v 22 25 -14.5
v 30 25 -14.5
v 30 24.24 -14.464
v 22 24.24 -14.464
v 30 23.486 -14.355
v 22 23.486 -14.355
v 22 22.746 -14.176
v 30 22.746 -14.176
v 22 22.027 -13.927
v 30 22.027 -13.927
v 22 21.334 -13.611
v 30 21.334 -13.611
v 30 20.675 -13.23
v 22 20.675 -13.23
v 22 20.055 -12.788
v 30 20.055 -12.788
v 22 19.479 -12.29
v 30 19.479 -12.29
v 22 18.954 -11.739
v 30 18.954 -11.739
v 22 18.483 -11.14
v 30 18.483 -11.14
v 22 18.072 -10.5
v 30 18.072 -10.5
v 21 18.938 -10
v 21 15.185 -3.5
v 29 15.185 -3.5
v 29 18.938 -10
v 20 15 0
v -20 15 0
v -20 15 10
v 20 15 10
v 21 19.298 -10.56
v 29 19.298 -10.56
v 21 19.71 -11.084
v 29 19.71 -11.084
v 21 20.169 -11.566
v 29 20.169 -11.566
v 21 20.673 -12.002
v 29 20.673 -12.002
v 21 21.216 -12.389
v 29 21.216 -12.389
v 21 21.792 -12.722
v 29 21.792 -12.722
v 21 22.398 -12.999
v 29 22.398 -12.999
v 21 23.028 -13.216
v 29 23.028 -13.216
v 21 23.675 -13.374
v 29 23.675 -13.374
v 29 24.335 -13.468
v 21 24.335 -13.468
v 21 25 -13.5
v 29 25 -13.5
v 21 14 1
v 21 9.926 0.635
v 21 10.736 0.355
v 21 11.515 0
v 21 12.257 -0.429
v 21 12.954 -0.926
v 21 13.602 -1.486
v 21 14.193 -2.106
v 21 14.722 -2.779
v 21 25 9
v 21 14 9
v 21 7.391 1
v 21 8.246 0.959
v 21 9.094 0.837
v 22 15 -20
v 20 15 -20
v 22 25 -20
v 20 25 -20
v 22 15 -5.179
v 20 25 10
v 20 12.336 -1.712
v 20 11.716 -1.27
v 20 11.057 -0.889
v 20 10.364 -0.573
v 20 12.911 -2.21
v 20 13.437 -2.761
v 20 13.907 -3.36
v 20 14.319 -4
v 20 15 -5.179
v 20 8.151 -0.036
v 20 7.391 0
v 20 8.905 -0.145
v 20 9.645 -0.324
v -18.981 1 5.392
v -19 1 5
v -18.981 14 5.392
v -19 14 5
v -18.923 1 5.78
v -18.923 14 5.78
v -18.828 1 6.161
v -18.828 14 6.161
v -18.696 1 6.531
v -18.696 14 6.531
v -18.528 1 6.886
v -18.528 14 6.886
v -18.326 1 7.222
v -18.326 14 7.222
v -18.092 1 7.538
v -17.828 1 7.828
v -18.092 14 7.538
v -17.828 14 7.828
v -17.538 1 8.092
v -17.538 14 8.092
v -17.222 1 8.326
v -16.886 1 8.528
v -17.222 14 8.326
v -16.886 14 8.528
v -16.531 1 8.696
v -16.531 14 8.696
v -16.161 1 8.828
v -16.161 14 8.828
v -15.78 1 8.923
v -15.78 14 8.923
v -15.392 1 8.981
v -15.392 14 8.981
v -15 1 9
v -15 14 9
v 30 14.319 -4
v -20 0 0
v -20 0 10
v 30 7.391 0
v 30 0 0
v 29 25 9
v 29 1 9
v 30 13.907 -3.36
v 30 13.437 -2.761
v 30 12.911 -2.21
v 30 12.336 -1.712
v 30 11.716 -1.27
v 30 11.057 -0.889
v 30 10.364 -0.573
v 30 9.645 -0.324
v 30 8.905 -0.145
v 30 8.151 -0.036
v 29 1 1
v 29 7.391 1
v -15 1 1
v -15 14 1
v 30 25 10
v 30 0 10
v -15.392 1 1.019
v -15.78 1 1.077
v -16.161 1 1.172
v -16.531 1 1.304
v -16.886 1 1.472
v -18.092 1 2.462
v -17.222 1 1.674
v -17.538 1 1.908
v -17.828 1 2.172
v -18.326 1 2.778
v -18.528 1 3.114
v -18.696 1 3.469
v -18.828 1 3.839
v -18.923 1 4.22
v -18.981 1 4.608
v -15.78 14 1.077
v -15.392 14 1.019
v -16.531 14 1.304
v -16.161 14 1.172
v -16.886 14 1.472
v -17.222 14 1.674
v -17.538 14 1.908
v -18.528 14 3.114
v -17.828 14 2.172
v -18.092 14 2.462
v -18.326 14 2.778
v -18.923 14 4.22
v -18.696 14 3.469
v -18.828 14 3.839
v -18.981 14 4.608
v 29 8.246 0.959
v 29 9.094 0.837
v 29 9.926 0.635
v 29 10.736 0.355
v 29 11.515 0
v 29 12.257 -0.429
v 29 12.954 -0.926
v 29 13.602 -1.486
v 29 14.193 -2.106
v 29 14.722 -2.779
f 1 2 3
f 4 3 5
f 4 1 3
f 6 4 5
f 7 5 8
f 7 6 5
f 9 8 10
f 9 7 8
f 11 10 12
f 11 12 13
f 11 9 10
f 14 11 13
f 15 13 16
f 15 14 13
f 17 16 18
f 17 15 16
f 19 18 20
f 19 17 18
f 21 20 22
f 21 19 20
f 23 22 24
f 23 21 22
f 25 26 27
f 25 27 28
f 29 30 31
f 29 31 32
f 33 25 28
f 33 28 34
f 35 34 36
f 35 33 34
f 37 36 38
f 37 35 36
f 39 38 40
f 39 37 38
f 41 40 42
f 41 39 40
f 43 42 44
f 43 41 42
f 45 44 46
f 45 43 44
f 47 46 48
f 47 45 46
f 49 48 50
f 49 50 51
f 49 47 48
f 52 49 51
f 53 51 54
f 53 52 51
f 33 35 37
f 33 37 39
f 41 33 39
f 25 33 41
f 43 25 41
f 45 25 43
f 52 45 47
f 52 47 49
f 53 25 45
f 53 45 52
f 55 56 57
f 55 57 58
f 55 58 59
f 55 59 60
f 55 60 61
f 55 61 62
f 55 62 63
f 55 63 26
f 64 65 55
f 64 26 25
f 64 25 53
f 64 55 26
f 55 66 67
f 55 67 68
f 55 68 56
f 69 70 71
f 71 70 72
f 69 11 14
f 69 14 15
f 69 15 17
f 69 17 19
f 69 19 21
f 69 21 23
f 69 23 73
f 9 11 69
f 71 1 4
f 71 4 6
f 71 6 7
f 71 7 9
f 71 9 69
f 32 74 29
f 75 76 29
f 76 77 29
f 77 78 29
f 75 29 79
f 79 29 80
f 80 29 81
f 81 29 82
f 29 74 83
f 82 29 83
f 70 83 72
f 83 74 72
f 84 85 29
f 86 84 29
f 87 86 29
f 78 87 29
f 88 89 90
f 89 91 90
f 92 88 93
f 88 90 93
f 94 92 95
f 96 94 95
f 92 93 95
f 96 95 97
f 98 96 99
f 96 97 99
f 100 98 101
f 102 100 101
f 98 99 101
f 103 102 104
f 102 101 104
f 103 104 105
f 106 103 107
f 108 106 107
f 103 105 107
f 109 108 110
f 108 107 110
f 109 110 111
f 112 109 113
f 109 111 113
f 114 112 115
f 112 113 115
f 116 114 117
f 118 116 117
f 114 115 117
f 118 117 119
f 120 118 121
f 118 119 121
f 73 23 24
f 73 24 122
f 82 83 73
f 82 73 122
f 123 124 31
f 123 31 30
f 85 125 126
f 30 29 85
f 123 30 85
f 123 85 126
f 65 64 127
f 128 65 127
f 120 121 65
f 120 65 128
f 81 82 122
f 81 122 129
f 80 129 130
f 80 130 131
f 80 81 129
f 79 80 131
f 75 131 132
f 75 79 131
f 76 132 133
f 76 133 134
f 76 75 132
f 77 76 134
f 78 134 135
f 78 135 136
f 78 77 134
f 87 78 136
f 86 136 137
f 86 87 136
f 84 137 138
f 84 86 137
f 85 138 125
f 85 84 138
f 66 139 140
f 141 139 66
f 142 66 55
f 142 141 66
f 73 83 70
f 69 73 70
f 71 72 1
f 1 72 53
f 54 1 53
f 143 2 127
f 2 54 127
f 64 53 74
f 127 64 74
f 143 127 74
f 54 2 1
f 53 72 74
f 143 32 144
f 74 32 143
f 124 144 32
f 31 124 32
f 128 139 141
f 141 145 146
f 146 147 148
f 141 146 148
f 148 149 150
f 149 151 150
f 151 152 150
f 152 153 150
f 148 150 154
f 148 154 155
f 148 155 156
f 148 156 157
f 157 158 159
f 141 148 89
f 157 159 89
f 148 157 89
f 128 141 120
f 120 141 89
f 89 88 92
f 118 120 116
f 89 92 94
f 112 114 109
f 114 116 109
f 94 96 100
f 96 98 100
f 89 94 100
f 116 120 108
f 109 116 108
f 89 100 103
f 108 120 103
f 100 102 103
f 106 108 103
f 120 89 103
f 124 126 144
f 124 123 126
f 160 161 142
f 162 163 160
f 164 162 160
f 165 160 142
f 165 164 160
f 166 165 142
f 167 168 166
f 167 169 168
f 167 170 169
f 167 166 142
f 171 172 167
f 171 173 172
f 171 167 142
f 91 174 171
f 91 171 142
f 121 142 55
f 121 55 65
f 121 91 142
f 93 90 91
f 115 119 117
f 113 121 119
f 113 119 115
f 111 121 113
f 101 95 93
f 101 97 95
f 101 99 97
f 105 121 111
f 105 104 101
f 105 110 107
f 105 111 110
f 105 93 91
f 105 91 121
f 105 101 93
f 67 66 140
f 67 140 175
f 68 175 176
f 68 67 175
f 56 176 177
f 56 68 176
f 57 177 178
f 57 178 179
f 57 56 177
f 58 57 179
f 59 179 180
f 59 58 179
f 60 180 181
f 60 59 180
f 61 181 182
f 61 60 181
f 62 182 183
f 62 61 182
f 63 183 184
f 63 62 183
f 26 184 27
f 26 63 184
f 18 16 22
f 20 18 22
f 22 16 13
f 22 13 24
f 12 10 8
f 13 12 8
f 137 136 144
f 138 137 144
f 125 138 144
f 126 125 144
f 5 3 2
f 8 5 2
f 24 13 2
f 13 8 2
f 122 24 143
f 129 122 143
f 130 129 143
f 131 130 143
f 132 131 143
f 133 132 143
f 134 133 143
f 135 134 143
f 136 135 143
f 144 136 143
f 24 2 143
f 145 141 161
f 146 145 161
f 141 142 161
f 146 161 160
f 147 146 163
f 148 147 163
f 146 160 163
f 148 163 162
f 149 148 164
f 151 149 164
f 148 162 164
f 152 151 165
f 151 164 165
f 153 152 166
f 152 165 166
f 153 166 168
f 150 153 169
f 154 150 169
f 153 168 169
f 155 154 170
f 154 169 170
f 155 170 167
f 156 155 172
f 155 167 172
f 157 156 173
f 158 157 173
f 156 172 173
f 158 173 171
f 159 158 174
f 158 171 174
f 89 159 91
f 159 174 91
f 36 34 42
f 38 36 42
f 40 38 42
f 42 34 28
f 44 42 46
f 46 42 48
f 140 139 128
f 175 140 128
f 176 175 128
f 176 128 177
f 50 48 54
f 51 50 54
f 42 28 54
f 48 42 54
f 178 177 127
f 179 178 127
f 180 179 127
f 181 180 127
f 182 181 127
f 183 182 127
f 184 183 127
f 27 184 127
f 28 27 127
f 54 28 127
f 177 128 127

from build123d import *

# Parameters (mm, degrees)
SKETCH1_W           = 40
SKETCH1_H           = 10
BOSS_EXTRUDE1_DEPTH = 15
BOSS_EXTRUDE2_DEPTH = 10
BOSS_EXTRUDE3_DEPTH = 2
SHELL1_START        = -19
SHELL1_OUTLINE_W    = 13
SHELL1_OUTLINE_H    = 8
SHELL1_DEPTH        = 48
SHELL1_START_2      = 21
SHELL1_2_DEPTH      = 8
FILLET1_R           = 4


# Read off the part's stored shape, not the designer's step: Shell1
with BuildPart() as part:
    # Sketch1 → Boss-Extrude1 (new body)
    with BuildSketch(Plane(origin=(0, 0, 0), x_dir=(1, 0, 0), z_dir=(0, 1, 0))):
        with Locations((0, -5)):
            Rectangle(SKETCH1_W, SKETCH1_H)
    extrude(amount=BOSS_EXTRUDE1_DEPTH)

    # Sketch2 → Boss-Extrude2 (add)
    with BuildSketch(Plane(origin=(20, 0, 0), x_dir=(0, 0, -1), z_dir=(1, 0, 0))):
        with BuildLine():
            Line((-10, 0), (-10, 25))
            Line((-10, 25), (14.5, 25))
            ThreePointArc((14.5, 25), (13.42820323, 21), (10.5, 18.07179677))
            Line((10.5, 18.07179677), (4, 14.31902002))
            ThreePointArc((4, 14.31902002), (1.07179677, 11.39081679), (0, 7.39081679))
            Line((0, 7.39081679), (0, 0))
            Line((0, 0), (-10, 0))
        make_face()
    extrude(amount=BOSS_EXTRUDE2_DEPTH)

    # Sketch3 → Boss-Extrude3 (add)
    with BuildSketch(Plane.ZY.offset(-20)):
        with BuildLine():
            Line((-5.179491924, 15), (-20, 15))
            Line((-20, 15), (-20, 25))
            Line((-20, 25), (-14.5, 25))
            ThreePointArc((-14.5, 25), (-13.42820323, 21), (-10.5, 18.07179677))
            Line((-10.5, 18.07179677), (-5.179491924, 15))
        make_face()
    extrude(amount=-BOSS_EXTRUDE3_DEPTH)

    # Shell1 outline → Shell1 (cut)
    with BuildSketch(Plane.YZ.offset(SHELL1_START)):
        with Locations((7.5, 5)):
            Rectangle(SHELL1_OUTLINE_W, SHELL1_OUTLINE_H)
    extrude(amount=SHELL1_DEPTH, mode=Mode.SUBTRACT)

    # Shell1 2 outline → Shell1 2 (cut)
    with BuildSketch(Plane.YZ.offset(SHELL1_START_2)):
        with BuildLine():
            ThreePointArc((18.937822174, -10), (21.5, -12.562177826), (25, -13.5))
            Line((25, -13.5), (25, 9))
            Line((25, 9), (14, 9))
            Line((14, 9), (14, 1))
            Line((14, 1), (7.39081679, 1))
            ThreePointArc((7.39081679, 1), (11.89081679, -0.205771366), (15.185045424, -3.5))
            Line((15.185045424, -3.5), (18.937822174, -10))
        make_face()
    extrude(amount=SHELL1_2_DEPTH, mode=Mode.SUBTRACT)

    # Fillet1
    fillet1_edges = [part.edges().sort_by_distance(p)[0] for p in [
        (-19, 7.5, 1),
        (-19, 7.5, 9),
    ]]
    fillet(fillet1_edges, radius=FILLET1_R - 0.0001)  # a hair under: the kernel refuses the full size


solid = part.part
